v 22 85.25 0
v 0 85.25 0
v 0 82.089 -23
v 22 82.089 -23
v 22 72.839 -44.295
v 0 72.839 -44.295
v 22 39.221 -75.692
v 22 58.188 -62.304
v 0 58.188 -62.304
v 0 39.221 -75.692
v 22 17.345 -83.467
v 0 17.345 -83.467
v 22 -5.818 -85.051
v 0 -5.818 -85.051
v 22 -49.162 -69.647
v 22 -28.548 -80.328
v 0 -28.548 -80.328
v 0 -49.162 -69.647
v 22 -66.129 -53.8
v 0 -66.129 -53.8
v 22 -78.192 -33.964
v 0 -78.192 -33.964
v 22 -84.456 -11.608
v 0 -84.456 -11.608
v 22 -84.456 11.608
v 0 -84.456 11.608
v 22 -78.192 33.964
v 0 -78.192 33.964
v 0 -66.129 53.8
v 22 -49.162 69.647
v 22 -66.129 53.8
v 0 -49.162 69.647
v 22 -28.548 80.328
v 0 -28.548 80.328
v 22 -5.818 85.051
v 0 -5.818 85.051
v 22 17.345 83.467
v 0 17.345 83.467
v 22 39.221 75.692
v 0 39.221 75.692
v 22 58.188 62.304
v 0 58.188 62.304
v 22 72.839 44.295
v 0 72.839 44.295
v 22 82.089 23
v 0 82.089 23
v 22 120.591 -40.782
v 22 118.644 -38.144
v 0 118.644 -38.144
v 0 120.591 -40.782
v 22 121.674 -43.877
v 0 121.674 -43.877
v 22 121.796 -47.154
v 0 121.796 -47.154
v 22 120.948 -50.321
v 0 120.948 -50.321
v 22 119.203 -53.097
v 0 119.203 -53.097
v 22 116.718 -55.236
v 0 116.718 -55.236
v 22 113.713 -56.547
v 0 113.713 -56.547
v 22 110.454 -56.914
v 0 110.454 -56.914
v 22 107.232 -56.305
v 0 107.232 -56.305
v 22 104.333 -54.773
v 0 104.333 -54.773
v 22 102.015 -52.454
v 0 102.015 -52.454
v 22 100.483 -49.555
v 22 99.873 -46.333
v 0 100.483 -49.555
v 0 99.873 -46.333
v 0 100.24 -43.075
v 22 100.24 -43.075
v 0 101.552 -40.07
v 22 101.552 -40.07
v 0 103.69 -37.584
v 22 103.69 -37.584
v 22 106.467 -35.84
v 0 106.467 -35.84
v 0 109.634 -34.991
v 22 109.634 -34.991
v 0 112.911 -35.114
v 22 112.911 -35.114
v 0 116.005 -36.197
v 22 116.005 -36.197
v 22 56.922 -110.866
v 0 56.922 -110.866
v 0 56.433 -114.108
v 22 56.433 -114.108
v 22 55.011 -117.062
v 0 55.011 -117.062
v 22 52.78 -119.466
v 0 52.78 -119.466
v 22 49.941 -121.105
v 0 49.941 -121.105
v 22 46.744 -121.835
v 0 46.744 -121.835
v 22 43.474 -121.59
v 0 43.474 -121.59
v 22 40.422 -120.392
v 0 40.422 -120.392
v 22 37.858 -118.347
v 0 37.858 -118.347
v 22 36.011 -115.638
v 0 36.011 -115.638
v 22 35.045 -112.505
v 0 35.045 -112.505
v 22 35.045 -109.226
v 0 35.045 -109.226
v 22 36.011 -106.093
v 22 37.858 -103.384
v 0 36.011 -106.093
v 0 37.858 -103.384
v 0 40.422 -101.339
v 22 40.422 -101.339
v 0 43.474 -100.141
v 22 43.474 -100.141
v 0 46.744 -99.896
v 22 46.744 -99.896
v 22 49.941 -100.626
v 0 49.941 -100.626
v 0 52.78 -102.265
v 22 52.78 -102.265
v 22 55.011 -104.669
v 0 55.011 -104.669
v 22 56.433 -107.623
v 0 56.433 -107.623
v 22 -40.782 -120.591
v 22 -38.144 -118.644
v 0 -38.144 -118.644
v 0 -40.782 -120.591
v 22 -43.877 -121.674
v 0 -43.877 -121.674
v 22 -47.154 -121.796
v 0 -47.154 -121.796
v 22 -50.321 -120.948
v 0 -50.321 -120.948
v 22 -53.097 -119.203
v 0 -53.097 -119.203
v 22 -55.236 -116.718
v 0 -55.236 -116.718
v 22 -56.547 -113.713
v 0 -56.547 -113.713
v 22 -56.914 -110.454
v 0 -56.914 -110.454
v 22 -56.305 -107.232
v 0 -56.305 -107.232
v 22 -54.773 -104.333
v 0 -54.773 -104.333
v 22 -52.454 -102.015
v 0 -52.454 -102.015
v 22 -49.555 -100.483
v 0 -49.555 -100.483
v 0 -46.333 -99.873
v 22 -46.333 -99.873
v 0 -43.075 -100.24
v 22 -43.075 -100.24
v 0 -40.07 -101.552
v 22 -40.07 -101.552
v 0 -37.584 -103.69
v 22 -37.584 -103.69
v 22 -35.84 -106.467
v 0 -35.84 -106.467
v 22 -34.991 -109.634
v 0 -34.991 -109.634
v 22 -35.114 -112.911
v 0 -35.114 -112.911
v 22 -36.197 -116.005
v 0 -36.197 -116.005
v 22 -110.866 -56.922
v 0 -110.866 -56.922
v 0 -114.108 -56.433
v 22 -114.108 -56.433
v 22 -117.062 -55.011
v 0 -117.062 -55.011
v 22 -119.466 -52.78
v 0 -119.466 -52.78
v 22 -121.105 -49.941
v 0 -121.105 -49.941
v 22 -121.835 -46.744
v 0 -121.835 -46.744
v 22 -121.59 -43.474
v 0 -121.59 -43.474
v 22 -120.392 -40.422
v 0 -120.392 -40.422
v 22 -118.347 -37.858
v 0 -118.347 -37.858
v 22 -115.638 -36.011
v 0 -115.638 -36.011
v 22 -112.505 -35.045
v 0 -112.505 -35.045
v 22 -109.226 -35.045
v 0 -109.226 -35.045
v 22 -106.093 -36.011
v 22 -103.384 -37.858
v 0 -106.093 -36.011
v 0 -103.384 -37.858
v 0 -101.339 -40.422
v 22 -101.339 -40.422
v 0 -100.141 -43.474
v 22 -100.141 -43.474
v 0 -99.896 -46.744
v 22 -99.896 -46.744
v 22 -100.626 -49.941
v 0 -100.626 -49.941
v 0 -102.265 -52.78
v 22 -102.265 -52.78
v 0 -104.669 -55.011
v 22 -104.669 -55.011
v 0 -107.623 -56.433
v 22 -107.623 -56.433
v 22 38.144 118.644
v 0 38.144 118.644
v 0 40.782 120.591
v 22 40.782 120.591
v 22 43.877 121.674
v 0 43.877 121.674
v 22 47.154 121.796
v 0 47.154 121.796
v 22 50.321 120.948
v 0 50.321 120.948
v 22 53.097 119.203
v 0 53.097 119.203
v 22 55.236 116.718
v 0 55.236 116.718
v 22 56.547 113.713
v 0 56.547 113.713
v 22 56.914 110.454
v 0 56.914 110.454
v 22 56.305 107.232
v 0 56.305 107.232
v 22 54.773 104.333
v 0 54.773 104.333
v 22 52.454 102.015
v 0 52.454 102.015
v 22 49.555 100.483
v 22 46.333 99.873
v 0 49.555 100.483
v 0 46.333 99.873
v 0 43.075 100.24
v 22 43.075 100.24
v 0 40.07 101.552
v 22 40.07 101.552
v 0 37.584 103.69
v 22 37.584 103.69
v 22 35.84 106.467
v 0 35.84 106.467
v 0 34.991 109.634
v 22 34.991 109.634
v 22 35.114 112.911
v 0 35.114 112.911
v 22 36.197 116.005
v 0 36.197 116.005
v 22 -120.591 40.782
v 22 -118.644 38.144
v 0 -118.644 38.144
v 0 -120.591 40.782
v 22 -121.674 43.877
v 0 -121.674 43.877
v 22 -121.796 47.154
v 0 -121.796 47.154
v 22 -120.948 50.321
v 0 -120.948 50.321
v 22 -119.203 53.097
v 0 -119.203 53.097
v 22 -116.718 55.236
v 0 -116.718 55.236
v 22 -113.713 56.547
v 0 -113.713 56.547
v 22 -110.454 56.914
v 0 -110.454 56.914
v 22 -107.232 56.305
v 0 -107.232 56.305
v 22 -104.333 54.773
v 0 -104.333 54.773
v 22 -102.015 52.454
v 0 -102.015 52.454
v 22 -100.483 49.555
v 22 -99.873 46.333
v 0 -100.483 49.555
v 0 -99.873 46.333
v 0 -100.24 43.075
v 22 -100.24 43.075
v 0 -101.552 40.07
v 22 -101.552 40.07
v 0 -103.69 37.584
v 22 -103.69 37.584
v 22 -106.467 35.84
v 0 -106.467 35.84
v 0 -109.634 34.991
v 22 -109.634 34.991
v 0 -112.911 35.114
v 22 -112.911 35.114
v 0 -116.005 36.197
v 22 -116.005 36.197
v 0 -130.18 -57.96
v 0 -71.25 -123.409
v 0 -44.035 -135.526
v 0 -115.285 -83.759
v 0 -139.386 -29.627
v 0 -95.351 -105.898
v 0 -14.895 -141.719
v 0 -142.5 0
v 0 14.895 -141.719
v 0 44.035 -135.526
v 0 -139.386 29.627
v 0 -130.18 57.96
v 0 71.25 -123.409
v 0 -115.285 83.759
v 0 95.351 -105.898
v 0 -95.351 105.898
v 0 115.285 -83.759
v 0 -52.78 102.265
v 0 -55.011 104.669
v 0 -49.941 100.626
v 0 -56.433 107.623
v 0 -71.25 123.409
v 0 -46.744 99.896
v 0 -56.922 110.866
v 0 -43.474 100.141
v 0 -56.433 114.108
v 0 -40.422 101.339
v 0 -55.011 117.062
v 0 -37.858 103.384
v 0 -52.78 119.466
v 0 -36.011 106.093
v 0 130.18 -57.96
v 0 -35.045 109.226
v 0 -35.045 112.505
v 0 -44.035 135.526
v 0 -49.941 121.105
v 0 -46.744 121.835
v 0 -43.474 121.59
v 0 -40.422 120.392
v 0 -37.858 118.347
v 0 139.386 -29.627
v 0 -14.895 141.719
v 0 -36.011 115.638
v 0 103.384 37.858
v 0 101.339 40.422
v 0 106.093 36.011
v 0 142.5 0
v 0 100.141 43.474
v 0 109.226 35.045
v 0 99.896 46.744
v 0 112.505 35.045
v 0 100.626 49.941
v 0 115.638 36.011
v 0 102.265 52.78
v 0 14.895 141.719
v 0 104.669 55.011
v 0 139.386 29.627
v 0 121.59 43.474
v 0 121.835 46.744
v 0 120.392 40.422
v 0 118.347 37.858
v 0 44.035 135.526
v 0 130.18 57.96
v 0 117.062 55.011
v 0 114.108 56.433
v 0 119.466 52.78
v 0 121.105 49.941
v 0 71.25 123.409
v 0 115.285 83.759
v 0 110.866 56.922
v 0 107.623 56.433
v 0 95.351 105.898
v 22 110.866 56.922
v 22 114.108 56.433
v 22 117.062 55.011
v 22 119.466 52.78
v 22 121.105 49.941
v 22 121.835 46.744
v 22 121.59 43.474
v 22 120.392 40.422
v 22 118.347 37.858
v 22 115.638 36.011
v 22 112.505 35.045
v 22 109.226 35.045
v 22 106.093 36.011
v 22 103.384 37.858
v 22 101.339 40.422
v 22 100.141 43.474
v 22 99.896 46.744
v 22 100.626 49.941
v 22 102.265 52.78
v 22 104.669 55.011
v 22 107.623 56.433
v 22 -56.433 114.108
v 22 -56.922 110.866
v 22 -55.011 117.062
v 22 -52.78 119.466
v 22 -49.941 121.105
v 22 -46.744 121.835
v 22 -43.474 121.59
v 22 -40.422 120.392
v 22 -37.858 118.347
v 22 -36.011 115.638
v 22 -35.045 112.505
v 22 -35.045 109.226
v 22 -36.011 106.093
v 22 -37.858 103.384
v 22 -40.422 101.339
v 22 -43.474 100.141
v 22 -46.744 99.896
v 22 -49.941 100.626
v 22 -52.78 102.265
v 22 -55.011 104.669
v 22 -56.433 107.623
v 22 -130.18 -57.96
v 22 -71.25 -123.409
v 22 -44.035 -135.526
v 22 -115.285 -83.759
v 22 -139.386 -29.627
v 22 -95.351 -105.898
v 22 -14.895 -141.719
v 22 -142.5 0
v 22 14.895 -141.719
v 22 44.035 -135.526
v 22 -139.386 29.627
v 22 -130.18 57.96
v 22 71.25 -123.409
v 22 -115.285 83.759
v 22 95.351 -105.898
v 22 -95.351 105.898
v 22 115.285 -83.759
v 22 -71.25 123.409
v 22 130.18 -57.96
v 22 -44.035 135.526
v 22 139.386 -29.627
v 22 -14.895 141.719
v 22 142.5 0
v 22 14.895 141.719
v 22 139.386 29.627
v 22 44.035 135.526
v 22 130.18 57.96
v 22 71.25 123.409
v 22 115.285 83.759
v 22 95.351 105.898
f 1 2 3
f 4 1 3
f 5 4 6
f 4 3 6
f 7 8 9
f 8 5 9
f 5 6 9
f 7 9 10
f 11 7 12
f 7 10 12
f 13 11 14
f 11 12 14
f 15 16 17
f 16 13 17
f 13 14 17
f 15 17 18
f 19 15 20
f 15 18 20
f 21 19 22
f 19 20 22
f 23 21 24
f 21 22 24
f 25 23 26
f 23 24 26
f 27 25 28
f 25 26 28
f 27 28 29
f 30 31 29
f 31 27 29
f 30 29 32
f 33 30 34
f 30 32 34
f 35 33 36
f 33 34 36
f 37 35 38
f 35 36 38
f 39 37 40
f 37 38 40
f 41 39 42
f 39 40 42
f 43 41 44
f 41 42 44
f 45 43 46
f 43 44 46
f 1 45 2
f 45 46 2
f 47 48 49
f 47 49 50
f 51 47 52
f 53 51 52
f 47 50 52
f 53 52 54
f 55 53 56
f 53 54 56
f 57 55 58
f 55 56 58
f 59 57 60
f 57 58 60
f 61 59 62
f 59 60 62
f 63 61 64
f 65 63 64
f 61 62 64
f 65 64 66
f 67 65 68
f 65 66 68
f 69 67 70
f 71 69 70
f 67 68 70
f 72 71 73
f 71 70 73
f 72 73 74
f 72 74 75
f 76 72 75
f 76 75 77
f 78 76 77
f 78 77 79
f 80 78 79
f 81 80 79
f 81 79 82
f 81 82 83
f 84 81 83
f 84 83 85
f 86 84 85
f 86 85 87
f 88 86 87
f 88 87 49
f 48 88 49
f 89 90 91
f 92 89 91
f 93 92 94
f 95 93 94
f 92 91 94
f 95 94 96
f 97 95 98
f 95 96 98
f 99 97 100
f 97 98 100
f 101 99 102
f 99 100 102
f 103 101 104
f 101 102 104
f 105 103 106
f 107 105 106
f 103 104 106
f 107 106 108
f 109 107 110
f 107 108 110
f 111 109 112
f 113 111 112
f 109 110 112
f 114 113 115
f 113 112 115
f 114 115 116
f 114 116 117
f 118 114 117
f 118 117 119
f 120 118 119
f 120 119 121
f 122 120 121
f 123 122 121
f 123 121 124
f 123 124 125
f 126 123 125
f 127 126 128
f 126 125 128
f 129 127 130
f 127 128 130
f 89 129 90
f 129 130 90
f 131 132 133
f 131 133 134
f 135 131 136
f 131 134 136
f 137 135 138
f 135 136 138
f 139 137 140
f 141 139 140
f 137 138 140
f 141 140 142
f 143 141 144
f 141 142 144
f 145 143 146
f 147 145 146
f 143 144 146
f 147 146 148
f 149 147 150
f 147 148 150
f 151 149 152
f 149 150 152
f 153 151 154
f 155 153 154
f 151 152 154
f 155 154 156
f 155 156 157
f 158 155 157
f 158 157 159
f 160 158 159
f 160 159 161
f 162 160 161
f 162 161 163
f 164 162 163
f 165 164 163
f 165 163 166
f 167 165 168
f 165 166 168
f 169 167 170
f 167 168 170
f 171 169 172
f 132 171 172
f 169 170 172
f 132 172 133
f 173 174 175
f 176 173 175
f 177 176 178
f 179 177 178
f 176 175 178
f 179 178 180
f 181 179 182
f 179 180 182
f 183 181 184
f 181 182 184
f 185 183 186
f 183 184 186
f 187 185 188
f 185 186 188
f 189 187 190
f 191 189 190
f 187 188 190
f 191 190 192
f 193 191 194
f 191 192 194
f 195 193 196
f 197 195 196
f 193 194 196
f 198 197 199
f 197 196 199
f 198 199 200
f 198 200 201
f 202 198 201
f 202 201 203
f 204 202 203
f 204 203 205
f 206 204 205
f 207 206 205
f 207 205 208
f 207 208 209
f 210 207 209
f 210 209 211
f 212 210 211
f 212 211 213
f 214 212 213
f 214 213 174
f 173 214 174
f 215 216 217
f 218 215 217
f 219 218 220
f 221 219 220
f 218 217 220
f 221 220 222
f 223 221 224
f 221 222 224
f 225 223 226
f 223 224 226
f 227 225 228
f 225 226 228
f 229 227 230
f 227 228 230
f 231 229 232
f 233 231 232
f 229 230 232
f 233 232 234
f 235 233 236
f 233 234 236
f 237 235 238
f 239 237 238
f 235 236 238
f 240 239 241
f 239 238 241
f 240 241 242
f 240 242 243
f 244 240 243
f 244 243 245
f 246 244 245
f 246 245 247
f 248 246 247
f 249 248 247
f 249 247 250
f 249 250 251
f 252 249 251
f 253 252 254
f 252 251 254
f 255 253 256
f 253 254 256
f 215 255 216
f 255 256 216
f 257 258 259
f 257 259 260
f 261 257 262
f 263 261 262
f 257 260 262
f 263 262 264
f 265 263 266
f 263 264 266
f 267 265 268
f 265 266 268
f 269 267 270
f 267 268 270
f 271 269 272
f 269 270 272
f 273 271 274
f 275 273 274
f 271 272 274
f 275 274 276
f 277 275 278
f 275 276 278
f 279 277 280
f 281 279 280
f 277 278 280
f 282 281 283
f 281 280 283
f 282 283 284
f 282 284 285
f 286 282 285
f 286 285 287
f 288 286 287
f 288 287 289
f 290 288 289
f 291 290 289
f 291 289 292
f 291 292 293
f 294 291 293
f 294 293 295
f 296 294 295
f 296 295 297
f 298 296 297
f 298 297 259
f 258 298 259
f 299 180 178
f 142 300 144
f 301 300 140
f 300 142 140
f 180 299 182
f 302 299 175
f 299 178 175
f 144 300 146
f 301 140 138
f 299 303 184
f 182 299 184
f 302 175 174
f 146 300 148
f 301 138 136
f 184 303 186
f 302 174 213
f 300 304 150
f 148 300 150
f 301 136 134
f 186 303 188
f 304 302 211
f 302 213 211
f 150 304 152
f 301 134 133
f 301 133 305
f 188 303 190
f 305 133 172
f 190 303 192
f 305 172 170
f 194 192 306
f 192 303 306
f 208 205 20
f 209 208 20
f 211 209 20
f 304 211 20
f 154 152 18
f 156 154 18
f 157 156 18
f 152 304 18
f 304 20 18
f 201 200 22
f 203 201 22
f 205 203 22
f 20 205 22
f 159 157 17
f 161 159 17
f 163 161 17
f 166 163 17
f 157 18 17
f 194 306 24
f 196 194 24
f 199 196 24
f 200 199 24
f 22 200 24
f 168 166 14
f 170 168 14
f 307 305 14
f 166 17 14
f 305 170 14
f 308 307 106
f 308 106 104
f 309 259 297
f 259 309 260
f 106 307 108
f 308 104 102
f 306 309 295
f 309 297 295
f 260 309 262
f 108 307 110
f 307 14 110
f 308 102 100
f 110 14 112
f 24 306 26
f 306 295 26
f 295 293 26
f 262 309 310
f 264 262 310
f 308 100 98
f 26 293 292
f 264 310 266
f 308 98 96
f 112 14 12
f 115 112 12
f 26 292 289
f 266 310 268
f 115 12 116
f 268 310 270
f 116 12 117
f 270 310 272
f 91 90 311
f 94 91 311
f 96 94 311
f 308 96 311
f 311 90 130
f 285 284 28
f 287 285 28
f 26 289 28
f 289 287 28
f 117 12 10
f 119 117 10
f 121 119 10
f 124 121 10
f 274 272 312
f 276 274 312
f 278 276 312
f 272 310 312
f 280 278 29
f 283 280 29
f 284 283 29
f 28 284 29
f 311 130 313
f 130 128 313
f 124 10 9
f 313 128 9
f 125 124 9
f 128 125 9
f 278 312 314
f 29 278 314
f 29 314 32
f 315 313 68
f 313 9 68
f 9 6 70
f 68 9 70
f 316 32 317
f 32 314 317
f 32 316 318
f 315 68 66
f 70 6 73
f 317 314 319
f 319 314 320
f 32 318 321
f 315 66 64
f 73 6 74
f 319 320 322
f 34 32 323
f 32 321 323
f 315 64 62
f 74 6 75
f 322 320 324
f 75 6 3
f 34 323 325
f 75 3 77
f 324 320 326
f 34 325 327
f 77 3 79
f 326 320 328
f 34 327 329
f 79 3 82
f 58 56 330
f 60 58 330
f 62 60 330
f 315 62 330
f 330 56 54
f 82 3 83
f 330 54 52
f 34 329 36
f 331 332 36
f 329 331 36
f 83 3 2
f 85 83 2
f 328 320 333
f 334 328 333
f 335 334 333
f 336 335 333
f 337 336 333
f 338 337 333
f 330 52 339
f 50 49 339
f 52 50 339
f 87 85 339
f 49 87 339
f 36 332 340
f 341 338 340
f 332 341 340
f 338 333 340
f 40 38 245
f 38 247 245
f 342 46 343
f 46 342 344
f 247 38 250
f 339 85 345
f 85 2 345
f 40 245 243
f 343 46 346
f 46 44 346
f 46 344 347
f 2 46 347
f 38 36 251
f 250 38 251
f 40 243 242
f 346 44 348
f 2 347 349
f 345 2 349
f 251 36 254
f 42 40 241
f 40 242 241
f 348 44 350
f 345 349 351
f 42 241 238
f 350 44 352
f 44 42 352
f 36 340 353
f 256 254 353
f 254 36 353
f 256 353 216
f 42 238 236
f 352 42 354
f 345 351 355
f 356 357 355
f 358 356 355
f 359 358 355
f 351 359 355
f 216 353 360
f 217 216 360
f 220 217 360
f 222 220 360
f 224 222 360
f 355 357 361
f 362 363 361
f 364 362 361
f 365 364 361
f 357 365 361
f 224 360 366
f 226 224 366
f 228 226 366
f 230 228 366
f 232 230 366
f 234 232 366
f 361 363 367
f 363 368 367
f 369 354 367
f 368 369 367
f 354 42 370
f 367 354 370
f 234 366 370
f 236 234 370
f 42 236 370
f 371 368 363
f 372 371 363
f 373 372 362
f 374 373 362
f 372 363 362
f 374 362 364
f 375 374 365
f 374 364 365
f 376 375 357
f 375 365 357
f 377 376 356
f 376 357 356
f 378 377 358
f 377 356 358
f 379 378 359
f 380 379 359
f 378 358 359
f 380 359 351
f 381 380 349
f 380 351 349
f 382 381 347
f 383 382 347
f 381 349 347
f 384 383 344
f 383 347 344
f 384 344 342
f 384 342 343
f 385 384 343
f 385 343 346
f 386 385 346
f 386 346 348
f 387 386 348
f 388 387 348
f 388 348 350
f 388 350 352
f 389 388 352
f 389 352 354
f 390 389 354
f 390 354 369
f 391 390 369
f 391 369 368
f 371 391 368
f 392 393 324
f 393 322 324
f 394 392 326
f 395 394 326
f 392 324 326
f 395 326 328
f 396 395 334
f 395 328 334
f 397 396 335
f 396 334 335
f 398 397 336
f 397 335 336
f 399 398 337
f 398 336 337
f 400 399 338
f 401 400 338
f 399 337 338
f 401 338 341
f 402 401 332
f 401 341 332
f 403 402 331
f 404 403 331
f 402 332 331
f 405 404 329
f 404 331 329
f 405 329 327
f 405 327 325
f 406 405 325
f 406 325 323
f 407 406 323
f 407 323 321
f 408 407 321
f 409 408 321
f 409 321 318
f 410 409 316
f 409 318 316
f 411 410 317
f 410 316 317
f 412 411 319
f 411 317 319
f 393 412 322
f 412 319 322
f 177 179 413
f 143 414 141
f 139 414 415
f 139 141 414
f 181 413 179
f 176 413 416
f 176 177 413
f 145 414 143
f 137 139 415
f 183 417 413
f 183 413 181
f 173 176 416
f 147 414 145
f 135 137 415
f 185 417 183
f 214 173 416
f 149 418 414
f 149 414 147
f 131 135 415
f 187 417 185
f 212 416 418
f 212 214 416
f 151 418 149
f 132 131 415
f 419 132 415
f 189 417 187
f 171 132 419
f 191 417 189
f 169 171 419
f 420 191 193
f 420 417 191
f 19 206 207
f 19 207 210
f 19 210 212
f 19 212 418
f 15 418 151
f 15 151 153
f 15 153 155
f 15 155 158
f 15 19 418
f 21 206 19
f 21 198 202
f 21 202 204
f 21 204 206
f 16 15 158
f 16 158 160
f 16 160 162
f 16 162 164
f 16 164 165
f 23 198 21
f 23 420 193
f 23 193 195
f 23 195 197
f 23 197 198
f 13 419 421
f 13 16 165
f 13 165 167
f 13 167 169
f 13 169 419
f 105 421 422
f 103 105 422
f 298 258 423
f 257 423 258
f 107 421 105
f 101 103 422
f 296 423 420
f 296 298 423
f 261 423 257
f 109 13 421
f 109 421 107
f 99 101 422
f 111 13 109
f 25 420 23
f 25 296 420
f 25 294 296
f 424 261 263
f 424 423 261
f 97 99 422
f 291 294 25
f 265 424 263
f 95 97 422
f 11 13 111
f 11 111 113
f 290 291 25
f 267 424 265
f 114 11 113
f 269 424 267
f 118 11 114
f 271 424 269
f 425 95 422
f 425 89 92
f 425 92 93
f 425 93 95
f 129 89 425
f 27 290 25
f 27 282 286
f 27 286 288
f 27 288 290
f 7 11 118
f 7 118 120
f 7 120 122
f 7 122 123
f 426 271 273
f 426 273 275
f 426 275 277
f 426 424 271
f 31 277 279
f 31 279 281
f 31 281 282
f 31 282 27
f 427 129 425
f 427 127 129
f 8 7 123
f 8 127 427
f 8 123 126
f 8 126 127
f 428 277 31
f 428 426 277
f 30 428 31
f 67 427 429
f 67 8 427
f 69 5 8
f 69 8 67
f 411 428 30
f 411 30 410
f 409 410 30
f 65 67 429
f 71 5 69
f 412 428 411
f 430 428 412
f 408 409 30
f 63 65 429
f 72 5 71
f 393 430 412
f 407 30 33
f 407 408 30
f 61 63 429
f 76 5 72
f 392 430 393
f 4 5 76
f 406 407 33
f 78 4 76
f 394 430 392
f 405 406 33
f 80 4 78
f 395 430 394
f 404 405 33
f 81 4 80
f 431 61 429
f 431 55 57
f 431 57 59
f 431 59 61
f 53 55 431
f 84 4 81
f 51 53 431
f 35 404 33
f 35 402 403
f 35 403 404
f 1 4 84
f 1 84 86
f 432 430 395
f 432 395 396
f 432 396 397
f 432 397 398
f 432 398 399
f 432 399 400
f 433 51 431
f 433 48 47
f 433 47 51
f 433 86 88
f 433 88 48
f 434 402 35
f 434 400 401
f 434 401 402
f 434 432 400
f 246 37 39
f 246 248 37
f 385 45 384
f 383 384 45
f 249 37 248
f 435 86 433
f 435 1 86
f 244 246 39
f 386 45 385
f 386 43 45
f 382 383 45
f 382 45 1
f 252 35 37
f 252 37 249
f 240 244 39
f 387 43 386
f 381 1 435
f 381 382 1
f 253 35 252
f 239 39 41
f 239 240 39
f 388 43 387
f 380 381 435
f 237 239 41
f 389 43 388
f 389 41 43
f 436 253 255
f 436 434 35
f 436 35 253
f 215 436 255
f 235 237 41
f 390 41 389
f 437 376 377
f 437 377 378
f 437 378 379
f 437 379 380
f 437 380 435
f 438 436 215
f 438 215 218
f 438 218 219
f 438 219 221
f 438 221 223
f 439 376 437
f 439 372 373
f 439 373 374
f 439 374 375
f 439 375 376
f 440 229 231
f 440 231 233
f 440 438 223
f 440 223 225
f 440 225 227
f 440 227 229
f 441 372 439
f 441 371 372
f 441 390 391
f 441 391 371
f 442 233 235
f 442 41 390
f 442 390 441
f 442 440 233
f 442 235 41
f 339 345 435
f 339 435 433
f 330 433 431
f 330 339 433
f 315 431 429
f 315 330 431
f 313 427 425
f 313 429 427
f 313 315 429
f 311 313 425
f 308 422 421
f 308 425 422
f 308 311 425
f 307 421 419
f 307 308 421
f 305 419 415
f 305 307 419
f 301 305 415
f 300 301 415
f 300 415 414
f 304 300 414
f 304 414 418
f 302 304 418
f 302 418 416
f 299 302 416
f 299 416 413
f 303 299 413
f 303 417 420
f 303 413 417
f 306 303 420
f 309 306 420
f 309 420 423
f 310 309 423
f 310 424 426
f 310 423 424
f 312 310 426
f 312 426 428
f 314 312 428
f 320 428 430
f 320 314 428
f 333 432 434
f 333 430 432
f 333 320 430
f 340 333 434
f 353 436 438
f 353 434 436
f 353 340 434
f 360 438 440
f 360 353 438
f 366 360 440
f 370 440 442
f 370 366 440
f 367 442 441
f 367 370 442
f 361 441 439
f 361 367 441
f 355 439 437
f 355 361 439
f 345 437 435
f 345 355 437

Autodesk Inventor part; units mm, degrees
ref_plane "YZ Plane" through (0, 0, 0) normal (1, 0, 0) x (0, 1, 0)
ref_plane "XZ Plane" through (0, 0, 0) normal (0, 1, 0) x (-1, 0, 0)
ref_plane "XY Plane" through (0, 0, 0) normal (0, 0, 1) x (1, 0, 0)
sketch "Sketch1" plane through (0, 0, 0) normal (0, 0, 1) x (1, 0, 0)
  line L0 (22, 142.5) -> (0, 142.5)
  line L1 (0, 142.5) -> (0, 85.25)
  line L2 (0, 85.25) -> (0, 0) construction
  line L3 (0, 0) -> (22, 0) construction
  line L4 (22, 142.5) -> (22, 85.25)
  line L5 (22, 85.25) -> (0, 85.25)
  line L6 (22, 85.25) -> (22, 0) construction
  dimension "d0" = 285
  dimension "d1" = 22
  dimension "d5" = 170.5
revolve "Revolution1" add sketch "Sketch1" angle 360 about axis through (0, 0, 0) along (1, 0, 0)
sketch "Sketch2" plane through (0, 0, 0) normal (-1, 0, 0) x (0, 0, 1)
  circle A0 centre (0, 0) radius 85.25 projected
  line L0 (0, 120) -> (0, 0) construction
  circle A1 centre (0, 0) radius 142.5 projected
  circle A2 centre (0, 0) radius 120 construction
  line L1 (0, 0) -> (45.922, 110.8655) construction
  circle A3 centre (45.922, 110.8655) radius 11
  dimension "d6" = 22
  dimension "d7" = 120
  dimension "d8" = 22.5
extrude "Extrusion1" cut sketch "Sketch2" against normal through all contours A3
pattern_circular "Circular Pattern1" count 8 over 360 about axis through (11, 0, 0) along (1, 0, 0) of "Extrusion1"
equation "\"d6\" = dd2"
equation "\"d7\" = 0.5 * k"
equation "\"d0\" = D"
equation "\"d1\" = b"
equation "\"d5\" = dd5"
equation "\"b\" = 22"
equation "\"D\" = 285"
equation "\"dd2\" = 22"
equation "\"dd5\" = 170.5"
equation "\"Size_Designation\" = 1.2345"
equation "\"k\" = 240"
properties part number "DIN 2576 Slip-On Flange for Welding Series 1 (ISO) - PN 10 150 x 168.3" material "Steel"
